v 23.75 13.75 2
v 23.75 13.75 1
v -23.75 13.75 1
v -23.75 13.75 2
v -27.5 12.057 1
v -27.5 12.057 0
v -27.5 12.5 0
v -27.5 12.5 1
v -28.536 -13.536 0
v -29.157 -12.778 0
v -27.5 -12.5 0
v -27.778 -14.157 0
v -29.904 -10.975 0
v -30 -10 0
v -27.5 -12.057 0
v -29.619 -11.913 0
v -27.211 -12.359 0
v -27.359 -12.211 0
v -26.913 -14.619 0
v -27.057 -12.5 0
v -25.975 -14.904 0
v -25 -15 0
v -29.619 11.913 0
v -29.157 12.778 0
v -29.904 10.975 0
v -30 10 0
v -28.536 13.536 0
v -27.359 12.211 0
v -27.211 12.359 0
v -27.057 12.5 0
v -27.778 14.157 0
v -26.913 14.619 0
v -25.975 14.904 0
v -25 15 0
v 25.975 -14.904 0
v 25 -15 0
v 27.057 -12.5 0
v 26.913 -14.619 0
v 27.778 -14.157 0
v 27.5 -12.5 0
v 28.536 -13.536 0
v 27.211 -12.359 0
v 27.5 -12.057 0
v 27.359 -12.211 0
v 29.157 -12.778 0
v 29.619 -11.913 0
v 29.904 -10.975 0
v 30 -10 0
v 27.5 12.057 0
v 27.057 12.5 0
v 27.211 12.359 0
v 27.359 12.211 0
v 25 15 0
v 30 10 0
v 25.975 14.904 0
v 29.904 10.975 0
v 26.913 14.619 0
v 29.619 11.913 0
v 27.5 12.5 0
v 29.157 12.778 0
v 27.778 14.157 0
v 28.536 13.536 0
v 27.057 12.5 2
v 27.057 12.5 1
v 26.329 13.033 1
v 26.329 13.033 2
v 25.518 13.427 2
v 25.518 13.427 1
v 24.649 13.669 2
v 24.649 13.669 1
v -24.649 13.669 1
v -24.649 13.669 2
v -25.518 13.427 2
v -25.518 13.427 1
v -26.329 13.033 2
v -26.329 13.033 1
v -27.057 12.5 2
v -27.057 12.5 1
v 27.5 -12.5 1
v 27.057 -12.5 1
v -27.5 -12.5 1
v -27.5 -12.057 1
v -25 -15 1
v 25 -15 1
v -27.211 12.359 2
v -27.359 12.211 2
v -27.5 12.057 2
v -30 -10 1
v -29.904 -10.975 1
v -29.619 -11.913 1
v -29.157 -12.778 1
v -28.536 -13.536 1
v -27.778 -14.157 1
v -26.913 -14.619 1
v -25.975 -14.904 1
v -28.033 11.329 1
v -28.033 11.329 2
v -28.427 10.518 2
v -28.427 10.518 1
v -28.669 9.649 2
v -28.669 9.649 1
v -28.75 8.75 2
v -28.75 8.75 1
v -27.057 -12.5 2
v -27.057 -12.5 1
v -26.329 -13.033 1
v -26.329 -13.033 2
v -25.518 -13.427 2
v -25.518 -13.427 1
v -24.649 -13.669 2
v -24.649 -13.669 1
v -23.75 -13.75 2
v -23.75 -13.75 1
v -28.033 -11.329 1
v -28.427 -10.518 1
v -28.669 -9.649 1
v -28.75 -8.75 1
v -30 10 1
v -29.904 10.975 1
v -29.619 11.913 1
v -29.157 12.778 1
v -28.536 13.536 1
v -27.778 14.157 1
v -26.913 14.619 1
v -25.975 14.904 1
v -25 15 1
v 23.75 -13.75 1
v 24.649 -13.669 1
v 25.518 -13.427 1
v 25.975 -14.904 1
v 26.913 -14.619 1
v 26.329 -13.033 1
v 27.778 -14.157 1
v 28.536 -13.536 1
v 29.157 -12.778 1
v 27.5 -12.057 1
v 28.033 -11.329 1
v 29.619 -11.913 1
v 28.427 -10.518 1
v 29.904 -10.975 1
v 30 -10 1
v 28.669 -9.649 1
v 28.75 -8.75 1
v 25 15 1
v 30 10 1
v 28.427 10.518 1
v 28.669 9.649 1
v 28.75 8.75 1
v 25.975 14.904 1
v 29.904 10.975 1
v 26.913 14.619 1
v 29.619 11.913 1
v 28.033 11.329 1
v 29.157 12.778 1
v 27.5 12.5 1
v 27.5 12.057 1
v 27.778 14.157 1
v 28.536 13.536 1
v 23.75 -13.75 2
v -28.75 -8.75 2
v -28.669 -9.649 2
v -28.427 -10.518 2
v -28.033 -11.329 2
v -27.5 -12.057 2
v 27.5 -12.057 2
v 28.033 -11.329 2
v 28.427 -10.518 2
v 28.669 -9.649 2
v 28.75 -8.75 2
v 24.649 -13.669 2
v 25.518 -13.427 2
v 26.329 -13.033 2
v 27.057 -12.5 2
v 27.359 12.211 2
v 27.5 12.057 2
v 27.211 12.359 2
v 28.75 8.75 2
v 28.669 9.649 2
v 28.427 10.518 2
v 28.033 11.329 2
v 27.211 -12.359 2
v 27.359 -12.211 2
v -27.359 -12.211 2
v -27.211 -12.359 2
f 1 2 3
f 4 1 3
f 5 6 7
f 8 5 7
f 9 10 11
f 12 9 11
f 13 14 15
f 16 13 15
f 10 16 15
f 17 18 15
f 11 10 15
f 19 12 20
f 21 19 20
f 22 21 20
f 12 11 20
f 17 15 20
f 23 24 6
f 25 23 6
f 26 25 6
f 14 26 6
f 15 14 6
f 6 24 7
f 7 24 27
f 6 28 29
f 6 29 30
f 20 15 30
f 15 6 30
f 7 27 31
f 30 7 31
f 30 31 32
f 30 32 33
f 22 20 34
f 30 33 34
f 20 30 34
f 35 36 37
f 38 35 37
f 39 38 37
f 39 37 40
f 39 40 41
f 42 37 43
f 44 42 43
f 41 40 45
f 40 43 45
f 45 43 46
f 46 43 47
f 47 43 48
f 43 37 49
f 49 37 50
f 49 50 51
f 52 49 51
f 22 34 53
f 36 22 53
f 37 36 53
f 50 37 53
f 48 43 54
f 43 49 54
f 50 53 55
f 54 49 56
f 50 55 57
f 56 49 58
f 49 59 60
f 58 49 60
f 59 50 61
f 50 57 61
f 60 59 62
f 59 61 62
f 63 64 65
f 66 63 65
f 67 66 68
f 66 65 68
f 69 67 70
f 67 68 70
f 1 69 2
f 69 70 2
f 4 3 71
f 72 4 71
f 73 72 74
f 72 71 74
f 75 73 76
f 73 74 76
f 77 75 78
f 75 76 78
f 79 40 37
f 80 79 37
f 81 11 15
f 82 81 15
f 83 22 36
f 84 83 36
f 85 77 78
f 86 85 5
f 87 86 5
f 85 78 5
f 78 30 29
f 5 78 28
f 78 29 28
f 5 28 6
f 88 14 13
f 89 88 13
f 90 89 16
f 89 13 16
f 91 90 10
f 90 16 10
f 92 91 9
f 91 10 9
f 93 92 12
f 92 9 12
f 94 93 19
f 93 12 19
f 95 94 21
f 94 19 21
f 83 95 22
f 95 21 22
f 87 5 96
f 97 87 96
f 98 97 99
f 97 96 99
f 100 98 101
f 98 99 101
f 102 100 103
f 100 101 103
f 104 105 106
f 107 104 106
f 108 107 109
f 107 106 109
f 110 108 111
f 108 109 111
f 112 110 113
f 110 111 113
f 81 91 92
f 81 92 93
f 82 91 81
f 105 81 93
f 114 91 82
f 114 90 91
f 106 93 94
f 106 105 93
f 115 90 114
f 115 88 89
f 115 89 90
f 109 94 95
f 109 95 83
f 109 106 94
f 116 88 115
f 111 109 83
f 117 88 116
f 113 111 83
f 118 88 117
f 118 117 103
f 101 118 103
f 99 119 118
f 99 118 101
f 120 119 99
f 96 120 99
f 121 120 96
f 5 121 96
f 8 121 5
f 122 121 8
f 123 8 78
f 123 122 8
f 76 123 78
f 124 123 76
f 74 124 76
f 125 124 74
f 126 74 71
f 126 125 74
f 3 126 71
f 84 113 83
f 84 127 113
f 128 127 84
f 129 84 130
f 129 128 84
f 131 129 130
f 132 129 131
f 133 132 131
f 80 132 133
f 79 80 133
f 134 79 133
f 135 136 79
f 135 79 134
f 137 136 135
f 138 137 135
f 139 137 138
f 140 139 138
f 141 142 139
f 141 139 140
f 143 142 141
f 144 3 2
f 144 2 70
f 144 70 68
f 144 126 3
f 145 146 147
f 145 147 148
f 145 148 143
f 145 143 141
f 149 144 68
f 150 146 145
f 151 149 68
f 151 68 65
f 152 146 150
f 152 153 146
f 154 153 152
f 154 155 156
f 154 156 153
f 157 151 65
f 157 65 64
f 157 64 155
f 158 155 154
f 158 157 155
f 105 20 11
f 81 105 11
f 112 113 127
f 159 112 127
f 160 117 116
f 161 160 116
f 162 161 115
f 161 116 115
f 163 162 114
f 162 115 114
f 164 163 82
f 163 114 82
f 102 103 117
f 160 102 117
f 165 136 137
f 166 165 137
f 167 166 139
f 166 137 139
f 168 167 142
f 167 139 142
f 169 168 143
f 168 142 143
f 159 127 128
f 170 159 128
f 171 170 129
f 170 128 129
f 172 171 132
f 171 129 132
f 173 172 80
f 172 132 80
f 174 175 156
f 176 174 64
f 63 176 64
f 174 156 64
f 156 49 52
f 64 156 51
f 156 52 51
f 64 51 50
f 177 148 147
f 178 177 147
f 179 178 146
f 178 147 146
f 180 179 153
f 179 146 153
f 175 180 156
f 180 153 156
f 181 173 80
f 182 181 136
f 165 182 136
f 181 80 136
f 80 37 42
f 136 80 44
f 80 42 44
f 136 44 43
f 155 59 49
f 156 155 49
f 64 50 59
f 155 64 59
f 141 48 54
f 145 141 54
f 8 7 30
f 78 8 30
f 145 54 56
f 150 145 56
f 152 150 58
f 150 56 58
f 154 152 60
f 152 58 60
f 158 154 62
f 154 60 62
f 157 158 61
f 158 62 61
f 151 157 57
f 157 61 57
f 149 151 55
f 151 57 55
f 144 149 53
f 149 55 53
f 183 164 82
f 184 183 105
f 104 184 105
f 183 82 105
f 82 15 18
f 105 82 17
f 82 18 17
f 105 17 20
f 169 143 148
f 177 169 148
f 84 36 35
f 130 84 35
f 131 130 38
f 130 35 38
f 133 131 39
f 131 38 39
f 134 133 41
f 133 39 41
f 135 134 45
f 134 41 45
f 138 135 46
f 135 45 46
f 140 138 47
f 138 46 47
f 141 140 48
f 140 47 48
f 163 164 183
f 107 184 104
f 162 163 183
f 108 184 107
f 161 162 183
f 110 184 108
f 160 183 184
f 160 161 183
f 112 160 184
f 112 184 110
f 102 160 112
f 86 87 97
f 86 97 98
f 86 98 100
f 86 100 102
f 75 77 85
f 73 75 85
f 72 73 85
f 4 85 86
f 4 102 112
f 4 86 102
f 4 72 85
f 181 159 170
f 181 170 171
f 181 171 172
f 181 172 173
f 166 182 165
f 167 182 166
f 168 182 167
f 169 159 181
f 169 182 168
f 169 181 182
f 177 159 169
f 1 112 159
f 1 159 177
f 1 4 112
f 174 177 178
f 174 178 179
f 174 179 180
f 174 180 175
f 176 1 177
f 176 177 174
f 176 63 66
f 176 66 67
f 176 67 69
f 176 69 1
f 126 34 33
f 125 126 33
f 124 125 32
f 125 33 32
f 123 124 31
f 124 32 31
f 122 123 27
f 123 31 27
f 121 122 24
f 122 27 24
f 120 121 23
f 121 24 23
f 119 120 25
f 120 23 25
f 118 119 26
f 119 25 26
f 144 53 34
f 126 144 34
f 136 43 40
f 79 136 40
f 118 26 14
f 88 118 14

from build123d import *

# Parameters (mm, degrees)
F1_DEPTH = 1
F2_DEPTH = 2


with BuildPart() as f1:
    # F0 (on Top) → F1 (new body)
    with BuildSketch(Plane.XY):
        with BuildLine():
            Line((25, 15), (-25, 15))
            ThreePointArc((-25, 15), (-28.5355339059, 13.5355339059), (-30, 10))
            Line((-30, 10), (-30, -10))
            ThreePointArc((-30, -10), (-28.5355339059, -13.5355339059), (-25, -15))
            Line((-25, -15), (25, -15))
            ThreePointArc((25, -15), (28.5355339059, -13.5355339059), (30, -10))
            Line((30, -10), (30, 10))
            ThreePointArc((30, 10), (28.5355339059, 13.5355339059), (25, 15))
        make_face()
        with BuildLine():
            Line((-27.5, 12.0571891388), (-27.5, 12.5))
            Line((-27.5, 12.5), (-27.0571891388, 12.5))
            ThreePointArc((-27.0571891388, 12.5), (-25.517766953, 13.4270717335), (-23.75, 13.75))
            Line((-23.75, 13.75), (23.75, 13.75))
            ThreePointArc((23.75, 13.75), (25.517766953, 13.4270717335), (27.0571891388, 12.5))
            Line((27.0571891388, 12.5), (27.5, 12.5))
            Line((27.5, 12.5), (27.5, 12.0571891388))
            ThreePointArc((27.5, 12.0571891388), (28.4270717335, 10.517766953), (28.75, 8.75))
            Line((28.75, 8.75), (28.75, -8.75))
            ThreePointArc((28.75, -8.75), (28.4270717335, -10.517766953), (27.5, -12.0571891388))
            Line((27.5, -12.0571891388), (27.5, -12.5))
            Line((27.5, -12.5), (27.0571891388, -12.5))
            ThreePointArc((27.0571891388, -12.5), (25.517766953, -13.4270717335), (23.75, -13.75))
            Line((23.75, -13.75), (-23.75, -13.75))
            ThreePointArc((-23.75, -13.75), (-25.517766953, -13.4270717335), (-27.0571891388, -12.5))
            Line((-27.0571891388, -12.5), (-27.5, -12.5))
            Line((-27.5, -12.5), (-27.5, -12.0571891388))
            ThreePointArc((-27.5, -12.0571891388), (-28.4270717335, -10.517766953), (-28.75, -8.75))
            Line((-28.75, -8.75), (-28.75, 8.75))
            ThreePointArc((-28.75, 8.75), (-28.4270717335, 10.517766953), (-27.5, 12.0571891388))
        make_face(mode=Mode.SUBTRACT)
    extrude(amount=F1_DEPTH)

    # F0 (on Top) → F2 (join)
    with BuildSketch(Plane.XY):
        with BuildLine():
            Line((27.0571891388, 12.5), (-27.0571891388, 12.5))
            ThreePointArc((-27.0571891388, 12.5), (-27.2855339059, 12.2855339059), (-27.5, 12.0571891388))
            Line((-27.5, 12.0571891388), (-27.5, -12.0571891388))
            ThreePointArc((-27.5, -12.0571891388), (-27.2855339059, -12.2855339059), (-27.0571891388, -12.5))
            Line((-27.0571891388, -12.5), (27.0571891388, -12.5))
            ThreePointArc((27.0571891388, -12.5), (27.2855339059, -12.2855339059), (27.5, -12.0571891388))
            Line((27.5, -12.0571891388), (27.5, 12.0571891388))
            ThreePointArc((27.5, 12.0571891388), (27.2855339059, 12.2855339059), (27.0571891388, 12.5))
        make_face()
        with BuildLine():
            ThreePointArc((28.75, 8.75), (28.4270717335, 10.517766953), (27.5, 12.0571891388))
            Line((27.5, 12.0571891388), (27.5, -12.0571891388))
            ThreePointArc((27.5, -12.0571891388), (28.4270717335, -10.517766953), (28.75, -8.75))
            Line((28.75, -8.75), (28.75, 8.75))
        make_face()
        with BuildLine():
            ThreePointArc((-23.75, 13.75), (-25.517766953, 13.4270717335), (-27.0571891388, 12.5))
            Line((-27.0571891388, 12.5), (27.0571891388, 12.5))
            ThreePointArc((27.0571891388, 12.5), (25.517766953, 13.4270717335), (23.75, 13.75))
            Line((23.75, 13.75), (-23.75, 13.75))
        make_face()
        with BuildLine():
            Line((27.0571891388, -12.5), (-27.0571891388, -12.5))
            ThreePointArc((-27.0571891388, -12.5), (-25.517766953, -13.4270717335), (-23.75, -13.75))
            Line((-23.75, -13.75), (23.75, -13.75))
            ThreePointArc((23.75, -13.75), (25.517766953, -13.4270717335), (27.0571891388, -12.5))
        make_face()
        with BuildLine():
            Line((-27.5, -12.0571891388), (-27.5, 12.0571891388))
            ThreePointArc((-27.5, 12.0571891388), (-28.4270717335, 10.517766953), (-28.75, 8.75))
            Line((-28.75, 8.75), (-28.75, -8.75))
            ThreePointArc((-28.75, -8.75), (-28.4270717335, -10.517766953), (-27.5, -12.0571891388))
        make_face()
    extrude(amount=F2_DEPTH)


solid = f1.part
